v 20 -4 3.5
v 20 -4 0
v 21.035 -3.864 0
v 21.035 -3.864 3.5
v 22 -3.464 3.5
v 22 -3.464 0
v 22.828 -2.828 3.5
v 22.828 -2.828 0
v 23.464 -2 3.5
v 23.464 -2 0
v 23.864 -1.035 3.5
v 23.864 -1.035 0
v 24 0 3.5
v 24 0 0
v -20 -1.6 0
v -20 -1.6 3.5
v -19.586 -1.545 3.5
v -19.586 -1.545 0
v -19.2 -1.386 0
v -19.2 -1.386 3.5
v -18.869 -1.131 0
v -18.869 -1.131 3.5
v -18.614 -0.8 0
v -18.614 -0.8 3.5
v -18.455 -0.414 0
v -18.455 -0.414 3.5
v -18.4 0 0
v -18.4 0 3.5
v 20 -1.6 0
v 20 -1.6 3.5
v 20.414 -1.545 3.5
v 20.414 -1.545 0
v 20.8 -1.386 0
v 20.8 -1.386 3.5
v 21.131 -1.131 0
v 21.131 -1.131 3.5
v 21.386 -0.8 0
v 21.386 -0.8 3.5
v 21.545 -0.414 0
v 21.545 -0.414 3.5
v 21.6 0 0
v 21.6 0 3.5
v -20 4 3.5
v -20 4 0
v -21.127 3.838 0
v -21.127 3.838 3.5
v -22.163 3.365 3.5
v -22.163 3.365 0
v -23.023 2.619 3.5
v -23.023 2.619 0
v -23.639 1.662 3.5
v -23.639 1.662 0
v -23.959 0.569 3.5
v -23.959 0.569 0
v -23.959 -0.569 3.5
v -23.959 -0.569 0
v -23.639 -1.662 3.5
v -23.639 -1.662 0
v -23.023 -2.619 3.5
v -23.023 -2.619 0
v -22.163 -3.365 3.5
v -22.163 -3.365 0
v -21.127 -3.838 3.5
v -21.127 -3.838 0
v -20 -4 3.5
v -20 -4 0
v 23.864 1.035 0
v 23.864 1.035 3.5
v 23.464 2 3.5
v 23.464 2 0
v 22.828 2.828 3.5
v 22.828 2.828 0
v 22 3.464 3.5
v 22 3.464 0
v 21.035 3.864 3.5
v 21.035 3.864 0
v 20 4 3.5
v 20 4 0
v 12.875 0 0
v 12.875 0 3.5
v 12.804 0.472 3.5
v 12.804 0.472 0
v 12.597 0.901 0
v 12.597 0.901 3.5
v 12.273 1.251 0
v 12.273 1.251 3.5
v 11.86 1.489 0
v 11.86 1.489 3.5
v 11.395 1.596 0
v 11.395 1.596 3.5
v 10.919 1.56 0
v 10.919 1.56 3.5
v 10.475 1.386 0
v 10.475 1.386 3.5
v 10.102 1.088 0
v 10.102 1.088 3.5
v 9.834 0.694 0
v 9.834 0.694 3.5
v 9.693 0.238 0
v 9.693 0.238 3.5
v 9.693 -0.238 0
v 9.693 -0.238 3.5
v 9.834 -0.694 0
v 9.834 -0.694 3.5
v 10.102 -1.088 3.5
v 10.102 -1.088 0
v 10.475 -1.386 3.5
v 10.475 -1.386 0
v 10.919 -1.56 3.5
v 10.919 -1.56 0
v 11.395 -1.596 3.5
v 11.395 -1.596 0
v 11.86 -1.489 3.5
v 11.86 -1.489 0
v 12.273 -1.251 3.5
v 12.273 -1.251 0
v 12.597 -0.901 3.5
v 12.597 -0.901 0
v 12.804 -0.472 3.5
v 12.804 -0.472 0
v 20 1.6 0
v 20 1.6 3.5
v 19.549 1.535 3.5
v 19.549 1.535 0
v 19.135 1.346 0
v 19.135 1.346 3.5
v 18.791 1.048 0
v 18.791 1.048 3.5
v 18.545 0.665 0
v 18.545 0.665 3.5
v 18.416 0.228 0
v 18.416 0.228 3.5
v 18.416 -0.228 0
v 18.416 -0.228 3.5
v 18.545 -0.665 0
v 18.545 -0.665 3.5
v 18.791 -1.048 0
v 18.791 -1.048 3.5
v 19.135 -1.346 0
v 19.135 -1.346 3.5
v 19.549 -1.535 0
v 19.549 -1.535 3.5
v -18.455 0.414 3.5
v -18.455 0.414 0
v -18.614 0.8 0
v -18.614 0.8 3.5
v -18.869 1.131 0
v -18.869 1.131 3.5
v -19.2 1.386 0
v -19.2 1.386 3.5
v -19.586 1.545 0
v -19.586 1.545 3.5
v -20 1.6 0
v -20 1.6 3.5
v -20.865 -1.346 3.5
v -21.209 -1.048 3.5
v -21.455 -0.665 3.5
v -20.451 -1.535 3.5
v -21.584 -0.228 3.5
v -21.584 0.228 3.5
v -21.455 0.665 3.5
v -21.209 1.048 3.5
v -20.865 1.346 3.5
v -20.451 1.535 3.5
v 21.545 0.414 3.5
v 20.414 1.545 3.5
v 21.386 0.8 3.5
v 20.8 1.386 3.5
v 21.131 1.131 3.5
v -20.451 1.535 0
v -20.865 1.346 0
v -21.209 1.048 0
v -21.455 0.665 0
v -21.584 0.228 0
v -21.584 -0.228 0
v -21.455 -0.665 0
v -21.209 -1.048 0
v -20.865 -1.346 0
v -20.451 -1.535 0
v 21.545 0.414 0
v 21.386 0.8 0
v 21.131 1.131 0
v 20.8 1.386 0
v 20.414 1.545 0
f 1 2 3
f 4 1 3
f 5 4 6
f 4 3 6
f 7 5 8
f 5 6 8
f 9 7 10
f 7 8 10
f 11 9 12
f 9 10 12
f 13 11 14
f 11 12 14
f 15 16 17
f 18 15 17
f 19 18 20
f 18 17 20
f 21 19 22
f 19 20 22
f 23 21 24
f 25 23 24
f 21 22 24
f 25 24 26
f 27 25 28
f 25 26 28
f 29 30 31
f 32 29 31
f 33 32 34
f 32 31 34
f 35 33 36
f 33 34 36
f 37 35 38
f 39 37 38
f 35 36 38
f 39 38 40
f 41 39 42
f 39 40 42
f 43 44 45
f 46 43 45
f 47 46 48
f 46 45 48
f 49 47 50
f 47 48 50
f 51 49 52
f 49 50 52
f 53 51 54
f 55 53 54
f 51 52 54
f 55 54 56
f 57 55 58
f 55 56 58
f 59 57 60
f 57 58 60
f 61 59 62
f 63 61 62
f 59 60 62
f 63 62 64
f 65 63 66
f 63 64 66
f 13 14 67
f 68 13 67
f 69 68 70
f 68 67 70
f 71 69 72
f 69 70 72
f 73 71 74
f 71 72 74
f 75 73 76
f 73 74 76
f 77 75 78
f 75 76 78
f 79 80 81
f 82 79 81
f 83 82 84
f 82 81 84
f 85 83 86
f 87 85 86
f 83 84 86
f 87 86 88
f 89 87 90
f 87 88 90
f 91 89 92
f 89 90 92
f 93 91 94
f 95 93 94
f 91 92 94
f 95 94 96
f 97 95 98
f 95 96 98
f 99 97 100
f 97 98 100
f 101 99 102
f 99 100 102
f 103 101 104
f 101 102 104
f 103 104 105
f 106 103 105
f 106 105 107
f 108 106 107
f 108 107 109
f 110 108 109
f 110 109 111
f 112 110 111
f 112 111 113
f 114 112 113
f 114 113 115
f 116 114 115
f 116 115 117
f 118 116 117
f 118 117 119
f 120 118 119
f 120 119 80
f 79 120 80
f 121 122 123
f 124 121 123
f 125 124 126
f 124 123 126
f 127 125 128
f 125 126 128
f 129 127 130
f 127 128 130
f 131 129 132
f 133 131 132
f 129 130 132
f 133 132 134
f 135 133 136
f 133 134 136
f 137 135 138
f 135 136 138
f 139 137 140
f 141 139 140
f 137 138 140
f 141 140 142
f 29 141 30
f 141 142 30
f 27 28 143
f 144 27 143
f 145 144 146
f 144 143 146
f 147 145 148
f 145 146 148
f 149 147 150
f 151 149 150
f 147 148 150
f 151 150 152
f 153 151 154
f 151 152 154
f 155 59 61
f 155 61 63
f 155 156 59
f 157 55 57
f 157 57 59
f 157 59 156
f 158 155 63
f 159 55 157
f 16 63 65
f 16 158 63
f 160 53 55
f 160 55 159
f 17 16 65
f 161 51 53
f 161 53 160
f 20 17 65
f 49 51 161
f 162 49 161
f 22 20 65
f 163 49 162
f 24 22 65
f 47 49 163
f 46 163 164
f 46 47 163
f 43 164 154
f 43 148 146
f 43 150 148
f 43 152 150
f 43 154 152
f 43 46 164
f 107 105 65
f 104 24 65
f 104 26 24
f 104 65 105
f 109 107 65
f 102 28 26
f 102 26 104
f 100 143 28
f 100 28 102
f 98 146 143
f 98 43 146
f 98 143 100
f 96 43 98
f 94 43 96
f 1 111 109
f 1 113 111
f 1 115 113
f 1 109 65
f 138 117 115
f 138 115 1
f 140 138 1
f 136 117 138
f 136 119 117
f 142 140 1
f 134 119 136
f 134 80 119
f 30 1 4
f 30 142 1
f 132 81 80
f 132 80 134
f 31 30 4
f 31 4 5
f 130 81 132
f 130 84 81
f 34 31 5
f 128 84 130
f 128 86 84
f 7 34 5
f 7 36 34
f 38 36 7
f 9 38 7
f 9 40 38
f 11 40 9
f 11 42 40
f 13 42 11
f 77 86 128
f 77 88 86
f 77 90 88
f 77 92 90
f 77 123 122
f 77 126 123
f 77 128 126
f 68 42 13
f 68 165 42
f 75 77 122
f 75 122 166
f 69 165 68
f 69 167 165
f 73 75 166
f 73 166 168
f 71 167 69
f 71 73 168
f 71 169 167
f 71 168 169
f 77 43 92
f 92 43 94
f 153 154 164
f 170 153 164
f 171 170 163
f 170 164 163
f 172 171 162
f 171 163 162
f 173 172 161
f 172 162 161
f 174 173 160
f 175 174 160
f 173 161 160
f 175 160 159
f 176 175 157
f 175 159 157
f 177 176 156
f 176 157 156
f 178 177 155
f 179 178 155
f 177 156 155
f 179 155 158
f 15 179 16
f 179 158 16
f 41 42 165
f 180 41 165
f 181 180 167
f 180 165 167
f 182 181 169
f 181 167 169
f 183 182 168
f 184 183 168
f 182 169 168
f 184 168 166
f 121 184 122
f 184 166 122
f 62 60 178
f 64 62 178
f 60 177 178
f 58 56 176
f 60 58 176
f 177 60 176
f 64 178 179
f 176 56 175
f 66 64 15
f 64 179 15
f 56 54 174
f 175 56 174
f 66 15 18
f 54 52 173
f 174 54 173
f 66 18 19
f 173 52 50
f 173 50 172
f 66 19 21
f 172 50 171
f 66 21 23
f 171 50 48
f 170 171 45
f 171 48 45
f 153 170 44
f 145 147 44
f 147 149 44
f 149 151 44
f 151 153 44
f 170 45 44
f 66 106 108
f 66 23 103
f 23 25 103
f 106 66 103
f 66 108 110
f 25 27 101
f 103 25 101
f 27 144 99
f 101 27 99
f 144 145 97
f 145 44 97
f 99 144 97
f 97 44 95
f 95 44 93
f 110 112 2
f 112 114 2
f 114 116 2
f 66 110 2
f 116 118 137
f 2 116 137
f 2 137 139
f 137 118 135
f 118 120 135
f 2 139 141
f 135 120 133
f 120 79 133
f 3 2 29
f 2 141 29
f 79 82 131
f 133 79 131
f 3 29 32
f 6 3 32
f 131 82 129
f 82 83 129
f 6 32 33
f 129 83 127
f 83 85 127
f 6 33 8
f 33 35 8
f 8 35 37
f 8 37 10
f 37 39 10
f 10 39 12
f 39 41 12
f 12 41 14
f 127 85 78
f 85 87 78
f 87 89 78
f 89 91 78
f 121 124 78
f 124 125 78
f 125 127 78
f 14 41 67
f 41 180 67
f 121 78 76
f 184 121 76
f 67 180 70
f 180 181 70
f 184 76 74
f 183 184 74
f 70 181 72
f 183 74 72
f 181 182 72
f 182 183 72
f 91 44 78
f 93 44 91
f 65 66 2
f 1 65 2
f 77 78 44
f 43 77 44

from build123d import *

# Parameters (mm, degrees)
F1_DEPTH = 3.5
F2_R     = 1.6
F3_DEPTH = 3.501


with BuildPart() as f1:
    # F0 (on Top) → F1 (new body)
    with BuildSketch(Plane.XY):
        with BuildLine():
            ThreePointArc((20, 4), (16, 0), (20, -4))
            Line((20, -4), (20, 4))
        make_face()
        with BuildLine():
            Line((-20, -4), (20, -4))
            ThreePointArc((20, -4), (16, 0), (20, 4))
            Line((20, 4), (-20, 4))
            ThreePointArc((-20, 4), (-17.1715728753, 2.8284271247), (-16, 0))
            ThreePointArc((-16, 0), (-17.1715728753, -2.8284271247), (-20, -4))
        make_face()
        with BuildLine():
            Line((20, 4), (20, -4))
            ThreePointArc((20, -4), (22.8284271247, -2.8284271247), (24, 0))
            ThreePointArc((24, 0), (22.8284271247, 2.8284271247), (20, 4))
        make_face()
        with BuildLine():
            ThreePointArc((-20, 4), (-24, 0), (-20, -4))
            Line((-20, -4), (-20, 4))
        make_face()
        with BuildLine():
            Line((-20, 4), (-20, -4))
            ThreePointArc((-20, -4), (-17.1715728753, -2.8284271247), (-16, 0))
            ThreePointArc((-16, 0), (-17.1715728753, 2.8284271247), (-20, 4))
        make_face()
    extrude(amount=F1_DEPTH)

    # F2 (on face) → F3 (cut, through all)
    with BuildSketch(Plane.XY.offset(3.5)):
        with BuildLine():
            ThreePointArc((-20, 1.6), (-21.6, 0), (-20, -1.6))
            Line((-20, -1.6), (-20, 1.6))
        make_face()
        with BuildLine():
            Line((-20, 1.6), (-20, -1.6))
            ThreePointArc((-20, -1.6), (-18.8686291501, -1.1313708499), (-18.4, 0))
            ThreePointArc((-18.4, 0), (-18.8686291501, 1.1313708499), (-20, 1.6))
        make_face()
        with BuildLine():
            ThreePointArc((20, 1.6), (18.4, 0), (20, -1.6))
            Line((20, -1.6), (20, 1.6))
        make_face()
        with BuildLine():
            Line((20, 1.6), (20, -1.6))
            ThreePointArc((20, -1.6), (21.1313708499, -1.1313708499), (21.6, 0))
            ThreePointArc((21.6, 0), (21.1313708499, 1.1313708499), (20, 1.6))
        make_face()
        with Locations((11.275196448, 0)):
            Circle(F2_R)
    extrude(amount=-F3_DEPTH, mode=Mode.SUBTRACT)


solid = f1.part
